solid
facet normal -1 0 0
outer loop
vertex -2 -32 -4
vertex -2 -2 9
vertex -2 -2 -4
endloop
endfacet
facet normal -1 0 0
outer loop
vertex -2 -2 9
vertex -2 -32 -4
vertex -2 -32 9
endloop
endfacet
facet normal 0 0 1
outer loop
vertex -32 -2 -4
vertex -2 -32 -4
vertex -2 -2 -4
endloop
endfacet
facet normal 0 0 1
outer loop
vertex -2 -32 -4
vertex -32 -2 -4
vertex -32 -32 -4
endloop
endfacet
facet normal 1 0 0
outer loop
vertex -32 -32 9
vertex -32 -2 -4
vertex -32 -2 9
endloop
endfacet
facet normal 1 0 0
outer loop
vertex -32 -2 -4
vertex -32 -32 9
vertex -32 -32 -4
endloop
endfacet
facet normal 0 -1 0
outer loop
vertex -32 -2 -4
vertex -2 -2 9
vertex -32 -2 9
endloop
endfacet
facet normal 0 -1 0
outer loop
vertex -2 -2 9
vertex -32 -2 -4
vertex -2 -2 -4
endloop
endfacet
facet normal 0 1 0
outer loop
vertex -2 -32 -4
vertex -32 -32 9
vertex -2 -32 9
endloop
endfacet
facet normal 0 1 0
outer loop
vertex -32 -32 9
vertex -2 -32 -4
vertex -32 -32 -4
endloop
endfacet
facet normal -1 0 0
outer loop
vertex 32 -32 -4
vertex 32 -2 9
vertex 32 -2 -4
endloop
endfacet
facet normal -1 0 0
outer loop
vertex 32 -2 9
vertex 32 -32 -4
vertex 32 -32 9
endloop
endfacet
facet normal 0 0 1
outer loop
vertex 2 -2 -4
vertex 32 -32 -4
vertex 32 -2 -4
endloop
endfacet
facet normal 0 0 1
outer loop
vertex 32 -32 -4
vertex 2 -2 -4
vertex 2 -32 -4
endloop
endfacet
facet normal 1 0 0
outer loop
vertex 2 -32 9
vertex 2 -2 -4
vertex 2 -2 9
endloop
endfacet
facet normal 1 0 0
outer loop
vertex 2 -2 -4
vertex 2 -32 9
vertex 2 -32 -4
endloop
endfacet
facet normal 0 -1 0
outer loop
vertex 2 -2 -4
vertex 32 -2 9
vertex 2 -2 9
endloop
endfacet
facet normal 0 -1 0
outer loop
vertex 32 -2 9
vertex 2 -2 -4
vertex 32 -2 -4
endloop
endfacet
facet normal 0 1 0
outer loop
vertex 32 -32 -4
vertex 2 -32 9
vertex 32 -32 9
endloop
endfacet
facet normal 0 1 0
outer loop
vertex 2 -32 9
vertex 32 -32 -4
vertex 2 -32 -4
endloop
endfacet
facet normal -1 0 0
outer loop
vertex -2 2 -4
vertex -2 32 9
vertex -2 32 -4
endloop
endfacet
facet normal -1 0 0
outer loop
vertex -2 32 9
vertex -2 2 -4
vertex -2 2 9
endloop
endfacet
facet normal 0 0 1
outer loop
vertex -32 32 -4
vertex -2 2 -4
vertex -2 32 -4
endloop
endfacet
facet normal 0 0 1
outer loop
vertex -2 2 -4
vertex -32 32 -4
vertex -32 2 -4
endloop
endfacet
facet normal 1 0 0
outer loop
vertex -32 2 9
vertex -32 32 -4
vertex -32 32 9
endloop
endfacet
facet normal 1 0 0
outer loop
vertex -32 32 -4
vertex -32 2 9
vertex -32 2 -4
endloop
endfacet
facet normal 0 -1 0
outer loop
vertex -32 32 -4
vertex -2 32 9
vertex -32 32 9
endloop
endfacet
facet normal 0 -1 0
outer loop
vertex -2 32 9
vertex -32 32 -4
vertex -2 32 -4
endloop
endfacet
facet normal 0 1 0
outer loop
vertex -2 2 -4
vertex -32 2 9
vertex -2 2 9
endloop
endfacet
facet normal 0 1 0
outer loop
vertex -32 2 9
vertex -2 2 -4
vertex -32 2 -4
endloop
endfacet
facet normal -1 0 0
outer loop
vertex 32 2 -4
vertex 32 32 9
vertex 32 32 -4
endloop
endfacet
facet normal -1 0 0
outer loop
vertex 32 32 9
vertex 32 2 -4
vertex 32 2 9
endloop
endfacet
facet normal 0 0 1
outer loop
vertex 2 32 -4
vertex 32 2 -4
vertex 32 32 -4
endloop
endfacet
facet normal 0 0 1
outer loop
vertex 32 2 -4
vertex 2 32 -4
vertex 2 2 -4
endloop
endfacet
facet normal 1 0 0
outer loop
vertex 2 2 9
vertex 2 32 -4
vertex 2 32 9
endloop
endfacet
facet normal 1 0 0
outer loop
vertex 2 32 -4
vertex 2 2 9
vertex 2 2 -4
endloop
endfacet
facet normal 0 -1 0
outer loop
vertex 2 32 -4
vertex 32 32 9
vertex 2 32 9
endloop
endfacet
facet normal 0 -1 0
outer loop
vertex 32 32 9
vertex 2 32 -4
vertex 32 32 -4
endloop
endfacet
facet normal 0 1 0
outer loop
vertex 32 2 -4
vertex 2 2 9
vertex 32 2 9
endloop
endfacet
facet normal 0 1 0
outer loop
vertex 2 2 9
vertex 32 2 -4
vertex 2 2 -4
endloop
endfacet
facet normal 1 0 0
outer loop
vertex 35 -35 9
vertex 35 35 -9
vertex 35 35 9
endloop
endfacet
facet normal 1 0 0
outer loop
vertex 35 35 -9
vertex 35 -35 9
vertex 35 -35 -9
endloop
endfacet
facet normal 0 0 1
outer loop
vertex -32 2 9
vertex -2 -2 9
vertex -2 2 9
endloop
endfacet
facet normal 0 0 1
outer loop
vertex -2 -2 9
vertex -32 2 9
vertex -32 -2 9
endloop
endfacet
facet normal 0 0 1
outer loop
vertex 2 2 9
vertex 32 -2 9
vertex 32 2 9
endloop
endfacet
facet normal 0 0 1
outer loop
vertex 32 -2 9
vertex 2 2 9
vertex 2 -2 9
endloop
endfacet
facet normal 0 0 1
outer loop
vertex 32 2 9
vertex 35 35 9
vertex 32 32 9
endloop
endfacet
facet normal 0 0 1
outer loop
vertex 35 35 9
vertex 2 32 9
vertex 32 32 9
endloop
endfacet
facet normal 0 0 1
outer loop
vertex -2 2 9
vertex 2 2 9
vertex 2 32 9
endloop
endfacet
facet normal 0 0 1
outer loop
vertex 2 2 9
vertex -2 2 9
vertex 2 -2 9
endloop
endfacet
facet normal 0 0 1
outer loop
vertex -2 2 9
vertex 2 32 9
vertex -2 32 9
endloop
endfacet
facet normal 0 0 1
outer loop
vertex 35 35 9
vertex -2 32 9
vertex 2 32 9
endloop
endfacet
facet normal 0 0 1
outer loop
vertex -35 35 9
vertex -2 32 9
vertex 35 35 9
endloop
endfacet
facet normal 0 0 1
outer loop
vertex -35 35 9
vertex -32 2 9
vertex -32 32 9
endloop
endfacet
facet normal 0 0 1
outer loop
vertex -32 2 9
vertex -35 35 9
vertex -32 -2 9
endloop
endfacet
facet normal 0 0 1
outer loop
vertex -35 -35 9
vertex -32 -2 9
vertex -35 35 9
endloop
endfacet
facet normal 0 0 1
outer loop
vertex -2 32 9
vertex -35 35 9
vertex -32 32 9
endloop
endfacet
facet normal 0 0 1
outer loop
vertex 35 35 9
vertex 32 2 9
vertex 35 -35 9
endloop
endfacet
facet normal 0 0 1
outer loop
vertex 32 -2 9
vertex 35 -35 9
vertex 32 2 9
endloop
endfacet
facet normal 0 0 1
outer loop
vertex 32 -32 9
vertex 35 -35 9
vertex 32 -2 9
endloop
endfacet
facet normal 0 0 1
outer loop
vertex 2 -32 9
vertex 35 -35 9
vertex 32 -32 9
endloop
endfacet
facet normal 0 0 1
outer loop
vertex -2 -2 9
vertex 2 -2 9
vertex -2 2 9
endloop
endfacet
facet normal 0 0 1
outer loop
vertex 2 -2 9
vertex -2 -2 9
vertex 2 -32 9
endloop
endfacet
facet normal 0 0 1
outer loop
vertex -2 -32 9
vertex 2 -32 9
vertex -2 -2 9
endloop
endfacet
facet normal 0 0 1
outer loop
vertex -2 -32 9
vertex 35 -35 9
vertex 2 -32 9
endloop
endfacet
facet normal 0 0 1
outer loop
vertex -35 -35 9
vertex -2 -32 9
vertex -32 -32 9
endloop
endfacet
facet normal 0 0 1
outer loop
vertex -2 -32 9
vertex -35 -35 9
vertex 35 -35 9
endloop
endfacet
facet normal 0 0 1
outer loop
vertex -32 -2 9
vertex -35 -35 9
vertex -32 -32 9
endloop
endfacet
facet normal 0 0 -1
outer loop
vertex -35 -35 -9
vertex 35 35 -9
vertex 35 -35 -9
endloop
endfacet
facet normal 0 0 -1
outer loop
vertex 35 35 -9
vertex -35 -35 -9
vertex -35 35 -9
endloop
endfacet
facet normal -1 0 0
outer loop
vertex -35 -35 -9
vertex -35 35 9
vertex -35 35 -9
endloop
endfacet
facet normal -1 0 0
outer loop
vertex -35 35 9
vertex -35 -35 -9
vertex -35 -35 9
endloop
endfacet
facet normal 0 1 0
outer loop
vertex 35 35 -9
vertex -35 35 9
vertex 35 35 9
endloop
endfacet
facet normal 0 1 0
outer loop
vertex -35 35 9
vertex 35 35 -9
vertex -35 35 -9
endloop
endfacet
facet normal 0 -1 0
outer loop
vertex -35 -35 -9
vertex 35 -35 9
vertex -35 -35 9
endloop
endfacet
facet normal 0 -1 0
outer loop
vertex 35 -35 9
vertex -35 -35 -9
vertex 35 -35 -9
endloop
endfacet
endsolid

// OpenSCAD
$fn = 32;

// ----------------------------------------------------------------------
// Pocket plate 70 x 70 x 18
// 2 x 2 pockets 30 mm square, 13 mm deep
// ----------------------------------------------------------------------

// --- parameters (mm) ---
thickness = 18;  // plate thickness
floor_t = 5;     // material left under each pocket
pocket = 30;     // pocket side length
pitch_x = 34;    // pocket pitch along X
pitch_y = 34;    // pocket pitch along Y
cols = 2;        // pockets per row
rows = 2;        // rows of pockets

// --- derived feature positions (mm) ---
depth = thickness - floor_t;        // = 13   pocket depth, down to the floor
span_x = (cols - 1) * pitch_x;      // = 34   distance between outer pockets
span_y = (rows - 1) * pitch_y;      // = 34   distance between outer pocket rows
origin_x = -span_x / 2;             // = -17   X of the first pocket
origin_y = -span_y / 2;             // = -17   Y of the first pocket
plate = [span_x + pocket + 6, span_y + pocket + 6, thickness];  // = [70, 70, 18]   overall size: pockets plus 3 mm of wall on each side
feature_centers = [
  [origin_x + 0 * pitch_x, origin_y + 0 * pitch_y],
  [origin_x + 1 * pitch_x, origin_y + 0 * pitch_y],
  [origin_x + 0 * pitch_x, origin_y + 1 * pitch_y],
  [origin_x + 1 * pitch_x, origin_y + 1 * pitch_y]
];   // pocket centres, used verbatim by the cutter loop

// plate outline, then one pocket per centre in feature_centers
difference() {
  cube(plate, center = true);
  for (centre = feature_centers)
    translate([centre[0] - pocket / 2, centre[1] - pocket / 2, plate[2] / 2 - depth])
      cube([pocket, pocket, depth + 1]);  // centred on the declared pocket centre
}
